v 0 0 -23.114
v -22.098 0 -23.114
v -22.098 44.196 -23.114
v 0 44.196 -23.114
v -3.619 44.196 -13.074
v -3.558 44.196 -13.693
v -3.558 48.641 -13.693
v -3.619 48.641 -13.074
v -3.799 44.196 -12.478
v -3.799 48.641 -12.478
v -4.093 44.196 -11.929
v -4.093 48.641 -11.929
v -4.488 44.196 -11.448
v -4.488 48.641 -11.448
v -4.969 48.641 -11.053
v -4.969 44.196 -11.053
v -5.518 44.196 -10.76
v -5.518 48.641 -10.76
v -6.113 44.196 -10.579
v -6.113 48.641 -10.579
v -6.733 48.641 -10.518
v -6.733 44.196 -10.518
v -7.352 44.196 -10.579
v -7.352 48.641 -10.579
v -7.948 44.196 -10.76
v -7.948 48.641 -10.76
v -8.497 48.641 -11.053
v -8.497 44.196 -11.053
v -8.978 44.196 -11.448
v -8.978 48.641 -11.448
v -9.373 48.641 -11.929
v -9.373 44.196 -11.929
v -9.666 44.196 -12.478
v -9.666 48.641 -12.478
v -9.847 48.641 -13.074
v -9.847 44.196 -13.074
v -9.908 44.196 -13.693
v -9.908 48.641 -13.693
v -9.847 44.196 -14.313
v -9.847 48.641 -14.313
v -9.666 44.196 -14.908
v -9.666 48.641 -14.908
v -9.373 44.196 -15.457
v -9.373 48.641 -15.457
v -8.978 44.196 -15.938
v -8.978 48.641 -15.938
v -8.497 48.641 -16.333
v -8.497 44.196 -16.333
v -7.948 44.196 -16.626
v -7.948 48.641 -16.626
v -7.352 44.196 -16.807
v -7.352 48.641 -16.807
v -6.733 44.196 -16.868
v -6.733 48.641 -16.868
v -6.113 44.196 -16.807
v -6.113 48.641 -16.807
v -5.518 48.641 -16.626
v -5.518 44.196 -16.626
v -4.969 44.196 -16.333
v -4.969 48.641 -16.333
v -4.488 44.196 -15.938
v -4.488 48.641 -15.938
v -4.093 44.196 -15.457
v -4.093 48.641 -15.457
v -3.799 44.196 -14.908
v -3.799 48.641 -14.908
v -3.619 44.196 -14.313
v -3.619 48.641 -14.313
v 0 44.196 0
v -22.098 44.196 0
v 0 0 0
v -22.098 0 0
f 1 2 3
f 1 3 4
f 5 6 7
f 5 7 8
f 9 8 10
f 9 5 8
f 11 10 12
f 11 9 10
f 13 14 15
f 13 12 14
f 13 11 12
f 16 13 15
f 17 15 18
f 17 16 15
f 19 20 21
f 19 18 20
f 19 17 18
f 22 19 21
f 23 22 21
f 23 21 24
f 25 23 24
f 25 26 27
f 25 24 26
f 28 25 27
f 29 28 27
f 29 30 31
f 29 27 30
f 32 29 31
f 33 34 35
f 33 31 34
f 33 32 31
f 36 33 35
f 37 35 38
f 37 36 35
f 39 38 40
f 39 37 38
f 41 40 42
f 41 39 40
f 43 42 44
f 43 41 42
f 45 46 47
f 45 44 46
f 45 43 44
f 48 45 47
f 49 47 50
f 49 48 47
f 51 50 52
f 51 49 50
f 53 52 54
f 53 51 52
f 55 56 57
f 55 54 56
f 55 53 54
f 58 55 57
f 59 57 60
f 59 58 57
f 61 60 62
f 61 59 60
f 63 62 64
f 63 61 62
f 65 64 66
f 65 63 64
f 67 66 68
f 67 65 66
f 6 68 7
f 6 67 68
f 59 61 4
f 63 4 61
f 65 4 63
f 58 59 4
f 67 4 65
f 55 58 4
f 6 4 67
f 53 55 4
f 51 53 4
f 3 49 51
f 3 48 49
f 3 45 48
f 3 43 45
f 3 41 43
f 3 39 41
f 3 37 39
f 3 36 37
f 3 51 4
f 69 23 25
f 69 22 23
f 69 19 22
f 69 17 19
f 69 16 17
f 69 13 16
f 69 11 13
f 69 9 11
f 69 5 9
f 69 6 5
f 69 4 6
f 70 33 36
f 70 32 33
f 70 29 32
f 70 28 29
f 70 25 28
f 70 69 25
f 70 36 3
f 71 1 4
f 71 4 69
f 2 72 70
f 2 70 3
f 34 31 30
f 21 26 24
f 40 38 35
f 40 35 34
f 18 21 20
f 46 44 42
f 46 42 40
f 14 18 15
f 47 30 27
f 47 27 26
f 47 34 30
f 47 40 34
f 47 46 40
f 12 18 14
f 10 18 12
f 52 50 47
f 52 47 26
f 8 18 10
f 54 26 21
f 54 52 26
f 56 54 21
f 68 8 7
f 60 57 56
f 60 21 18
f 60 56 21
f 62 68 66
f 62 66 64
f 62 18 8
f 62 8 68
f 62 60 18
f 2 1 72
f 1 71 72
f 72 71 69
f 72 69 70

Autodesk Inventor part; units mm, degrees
ref_plane "YZ Plane" through (0, 0, 0) normal (1, 0, 0) x (0, 1, 0)
ref_plane "XZ Plane" through (0, 0, 0) normal (0, 1, 0) x (-1, 0, 0)
ref_plane "XY Plane" through (0, 0, 0) normal (0, 0, 1) x (1, 0, 0)
sketch "Sketch1" plane through (0, 0, 0) normal (0, 1, 0) x (-1, 0, 0)
  line L0 (0, 0) -> (22.098, 0)
  line L1 (22.098, 0) -> (22.098, -23.114)
  line L2 (22.098, -23.114) -> (0, -23.114)
  line L3 (0, -23.114) -> (0, 0)
  dimension "d0" = 22.098
  dimension "d1" = 23.114
extrude "Extrusion1" add sketch "Sketch1" along normal blind 44.196
sketch "Sketch2" plane through (0, 44.196, 0) normal (0, 1, 0) x (1, 0, 0)
  circle A0 centre (-6.7327, 13.6931) radius 3.175
  point P0 (0, 0)
  dimension "d4" = 6.35
extrude "Extrusion2" add sketch "Sketch2" along normal blind 4.445
properties part number "arduino_radio_volume" material "ABS Plastic"
